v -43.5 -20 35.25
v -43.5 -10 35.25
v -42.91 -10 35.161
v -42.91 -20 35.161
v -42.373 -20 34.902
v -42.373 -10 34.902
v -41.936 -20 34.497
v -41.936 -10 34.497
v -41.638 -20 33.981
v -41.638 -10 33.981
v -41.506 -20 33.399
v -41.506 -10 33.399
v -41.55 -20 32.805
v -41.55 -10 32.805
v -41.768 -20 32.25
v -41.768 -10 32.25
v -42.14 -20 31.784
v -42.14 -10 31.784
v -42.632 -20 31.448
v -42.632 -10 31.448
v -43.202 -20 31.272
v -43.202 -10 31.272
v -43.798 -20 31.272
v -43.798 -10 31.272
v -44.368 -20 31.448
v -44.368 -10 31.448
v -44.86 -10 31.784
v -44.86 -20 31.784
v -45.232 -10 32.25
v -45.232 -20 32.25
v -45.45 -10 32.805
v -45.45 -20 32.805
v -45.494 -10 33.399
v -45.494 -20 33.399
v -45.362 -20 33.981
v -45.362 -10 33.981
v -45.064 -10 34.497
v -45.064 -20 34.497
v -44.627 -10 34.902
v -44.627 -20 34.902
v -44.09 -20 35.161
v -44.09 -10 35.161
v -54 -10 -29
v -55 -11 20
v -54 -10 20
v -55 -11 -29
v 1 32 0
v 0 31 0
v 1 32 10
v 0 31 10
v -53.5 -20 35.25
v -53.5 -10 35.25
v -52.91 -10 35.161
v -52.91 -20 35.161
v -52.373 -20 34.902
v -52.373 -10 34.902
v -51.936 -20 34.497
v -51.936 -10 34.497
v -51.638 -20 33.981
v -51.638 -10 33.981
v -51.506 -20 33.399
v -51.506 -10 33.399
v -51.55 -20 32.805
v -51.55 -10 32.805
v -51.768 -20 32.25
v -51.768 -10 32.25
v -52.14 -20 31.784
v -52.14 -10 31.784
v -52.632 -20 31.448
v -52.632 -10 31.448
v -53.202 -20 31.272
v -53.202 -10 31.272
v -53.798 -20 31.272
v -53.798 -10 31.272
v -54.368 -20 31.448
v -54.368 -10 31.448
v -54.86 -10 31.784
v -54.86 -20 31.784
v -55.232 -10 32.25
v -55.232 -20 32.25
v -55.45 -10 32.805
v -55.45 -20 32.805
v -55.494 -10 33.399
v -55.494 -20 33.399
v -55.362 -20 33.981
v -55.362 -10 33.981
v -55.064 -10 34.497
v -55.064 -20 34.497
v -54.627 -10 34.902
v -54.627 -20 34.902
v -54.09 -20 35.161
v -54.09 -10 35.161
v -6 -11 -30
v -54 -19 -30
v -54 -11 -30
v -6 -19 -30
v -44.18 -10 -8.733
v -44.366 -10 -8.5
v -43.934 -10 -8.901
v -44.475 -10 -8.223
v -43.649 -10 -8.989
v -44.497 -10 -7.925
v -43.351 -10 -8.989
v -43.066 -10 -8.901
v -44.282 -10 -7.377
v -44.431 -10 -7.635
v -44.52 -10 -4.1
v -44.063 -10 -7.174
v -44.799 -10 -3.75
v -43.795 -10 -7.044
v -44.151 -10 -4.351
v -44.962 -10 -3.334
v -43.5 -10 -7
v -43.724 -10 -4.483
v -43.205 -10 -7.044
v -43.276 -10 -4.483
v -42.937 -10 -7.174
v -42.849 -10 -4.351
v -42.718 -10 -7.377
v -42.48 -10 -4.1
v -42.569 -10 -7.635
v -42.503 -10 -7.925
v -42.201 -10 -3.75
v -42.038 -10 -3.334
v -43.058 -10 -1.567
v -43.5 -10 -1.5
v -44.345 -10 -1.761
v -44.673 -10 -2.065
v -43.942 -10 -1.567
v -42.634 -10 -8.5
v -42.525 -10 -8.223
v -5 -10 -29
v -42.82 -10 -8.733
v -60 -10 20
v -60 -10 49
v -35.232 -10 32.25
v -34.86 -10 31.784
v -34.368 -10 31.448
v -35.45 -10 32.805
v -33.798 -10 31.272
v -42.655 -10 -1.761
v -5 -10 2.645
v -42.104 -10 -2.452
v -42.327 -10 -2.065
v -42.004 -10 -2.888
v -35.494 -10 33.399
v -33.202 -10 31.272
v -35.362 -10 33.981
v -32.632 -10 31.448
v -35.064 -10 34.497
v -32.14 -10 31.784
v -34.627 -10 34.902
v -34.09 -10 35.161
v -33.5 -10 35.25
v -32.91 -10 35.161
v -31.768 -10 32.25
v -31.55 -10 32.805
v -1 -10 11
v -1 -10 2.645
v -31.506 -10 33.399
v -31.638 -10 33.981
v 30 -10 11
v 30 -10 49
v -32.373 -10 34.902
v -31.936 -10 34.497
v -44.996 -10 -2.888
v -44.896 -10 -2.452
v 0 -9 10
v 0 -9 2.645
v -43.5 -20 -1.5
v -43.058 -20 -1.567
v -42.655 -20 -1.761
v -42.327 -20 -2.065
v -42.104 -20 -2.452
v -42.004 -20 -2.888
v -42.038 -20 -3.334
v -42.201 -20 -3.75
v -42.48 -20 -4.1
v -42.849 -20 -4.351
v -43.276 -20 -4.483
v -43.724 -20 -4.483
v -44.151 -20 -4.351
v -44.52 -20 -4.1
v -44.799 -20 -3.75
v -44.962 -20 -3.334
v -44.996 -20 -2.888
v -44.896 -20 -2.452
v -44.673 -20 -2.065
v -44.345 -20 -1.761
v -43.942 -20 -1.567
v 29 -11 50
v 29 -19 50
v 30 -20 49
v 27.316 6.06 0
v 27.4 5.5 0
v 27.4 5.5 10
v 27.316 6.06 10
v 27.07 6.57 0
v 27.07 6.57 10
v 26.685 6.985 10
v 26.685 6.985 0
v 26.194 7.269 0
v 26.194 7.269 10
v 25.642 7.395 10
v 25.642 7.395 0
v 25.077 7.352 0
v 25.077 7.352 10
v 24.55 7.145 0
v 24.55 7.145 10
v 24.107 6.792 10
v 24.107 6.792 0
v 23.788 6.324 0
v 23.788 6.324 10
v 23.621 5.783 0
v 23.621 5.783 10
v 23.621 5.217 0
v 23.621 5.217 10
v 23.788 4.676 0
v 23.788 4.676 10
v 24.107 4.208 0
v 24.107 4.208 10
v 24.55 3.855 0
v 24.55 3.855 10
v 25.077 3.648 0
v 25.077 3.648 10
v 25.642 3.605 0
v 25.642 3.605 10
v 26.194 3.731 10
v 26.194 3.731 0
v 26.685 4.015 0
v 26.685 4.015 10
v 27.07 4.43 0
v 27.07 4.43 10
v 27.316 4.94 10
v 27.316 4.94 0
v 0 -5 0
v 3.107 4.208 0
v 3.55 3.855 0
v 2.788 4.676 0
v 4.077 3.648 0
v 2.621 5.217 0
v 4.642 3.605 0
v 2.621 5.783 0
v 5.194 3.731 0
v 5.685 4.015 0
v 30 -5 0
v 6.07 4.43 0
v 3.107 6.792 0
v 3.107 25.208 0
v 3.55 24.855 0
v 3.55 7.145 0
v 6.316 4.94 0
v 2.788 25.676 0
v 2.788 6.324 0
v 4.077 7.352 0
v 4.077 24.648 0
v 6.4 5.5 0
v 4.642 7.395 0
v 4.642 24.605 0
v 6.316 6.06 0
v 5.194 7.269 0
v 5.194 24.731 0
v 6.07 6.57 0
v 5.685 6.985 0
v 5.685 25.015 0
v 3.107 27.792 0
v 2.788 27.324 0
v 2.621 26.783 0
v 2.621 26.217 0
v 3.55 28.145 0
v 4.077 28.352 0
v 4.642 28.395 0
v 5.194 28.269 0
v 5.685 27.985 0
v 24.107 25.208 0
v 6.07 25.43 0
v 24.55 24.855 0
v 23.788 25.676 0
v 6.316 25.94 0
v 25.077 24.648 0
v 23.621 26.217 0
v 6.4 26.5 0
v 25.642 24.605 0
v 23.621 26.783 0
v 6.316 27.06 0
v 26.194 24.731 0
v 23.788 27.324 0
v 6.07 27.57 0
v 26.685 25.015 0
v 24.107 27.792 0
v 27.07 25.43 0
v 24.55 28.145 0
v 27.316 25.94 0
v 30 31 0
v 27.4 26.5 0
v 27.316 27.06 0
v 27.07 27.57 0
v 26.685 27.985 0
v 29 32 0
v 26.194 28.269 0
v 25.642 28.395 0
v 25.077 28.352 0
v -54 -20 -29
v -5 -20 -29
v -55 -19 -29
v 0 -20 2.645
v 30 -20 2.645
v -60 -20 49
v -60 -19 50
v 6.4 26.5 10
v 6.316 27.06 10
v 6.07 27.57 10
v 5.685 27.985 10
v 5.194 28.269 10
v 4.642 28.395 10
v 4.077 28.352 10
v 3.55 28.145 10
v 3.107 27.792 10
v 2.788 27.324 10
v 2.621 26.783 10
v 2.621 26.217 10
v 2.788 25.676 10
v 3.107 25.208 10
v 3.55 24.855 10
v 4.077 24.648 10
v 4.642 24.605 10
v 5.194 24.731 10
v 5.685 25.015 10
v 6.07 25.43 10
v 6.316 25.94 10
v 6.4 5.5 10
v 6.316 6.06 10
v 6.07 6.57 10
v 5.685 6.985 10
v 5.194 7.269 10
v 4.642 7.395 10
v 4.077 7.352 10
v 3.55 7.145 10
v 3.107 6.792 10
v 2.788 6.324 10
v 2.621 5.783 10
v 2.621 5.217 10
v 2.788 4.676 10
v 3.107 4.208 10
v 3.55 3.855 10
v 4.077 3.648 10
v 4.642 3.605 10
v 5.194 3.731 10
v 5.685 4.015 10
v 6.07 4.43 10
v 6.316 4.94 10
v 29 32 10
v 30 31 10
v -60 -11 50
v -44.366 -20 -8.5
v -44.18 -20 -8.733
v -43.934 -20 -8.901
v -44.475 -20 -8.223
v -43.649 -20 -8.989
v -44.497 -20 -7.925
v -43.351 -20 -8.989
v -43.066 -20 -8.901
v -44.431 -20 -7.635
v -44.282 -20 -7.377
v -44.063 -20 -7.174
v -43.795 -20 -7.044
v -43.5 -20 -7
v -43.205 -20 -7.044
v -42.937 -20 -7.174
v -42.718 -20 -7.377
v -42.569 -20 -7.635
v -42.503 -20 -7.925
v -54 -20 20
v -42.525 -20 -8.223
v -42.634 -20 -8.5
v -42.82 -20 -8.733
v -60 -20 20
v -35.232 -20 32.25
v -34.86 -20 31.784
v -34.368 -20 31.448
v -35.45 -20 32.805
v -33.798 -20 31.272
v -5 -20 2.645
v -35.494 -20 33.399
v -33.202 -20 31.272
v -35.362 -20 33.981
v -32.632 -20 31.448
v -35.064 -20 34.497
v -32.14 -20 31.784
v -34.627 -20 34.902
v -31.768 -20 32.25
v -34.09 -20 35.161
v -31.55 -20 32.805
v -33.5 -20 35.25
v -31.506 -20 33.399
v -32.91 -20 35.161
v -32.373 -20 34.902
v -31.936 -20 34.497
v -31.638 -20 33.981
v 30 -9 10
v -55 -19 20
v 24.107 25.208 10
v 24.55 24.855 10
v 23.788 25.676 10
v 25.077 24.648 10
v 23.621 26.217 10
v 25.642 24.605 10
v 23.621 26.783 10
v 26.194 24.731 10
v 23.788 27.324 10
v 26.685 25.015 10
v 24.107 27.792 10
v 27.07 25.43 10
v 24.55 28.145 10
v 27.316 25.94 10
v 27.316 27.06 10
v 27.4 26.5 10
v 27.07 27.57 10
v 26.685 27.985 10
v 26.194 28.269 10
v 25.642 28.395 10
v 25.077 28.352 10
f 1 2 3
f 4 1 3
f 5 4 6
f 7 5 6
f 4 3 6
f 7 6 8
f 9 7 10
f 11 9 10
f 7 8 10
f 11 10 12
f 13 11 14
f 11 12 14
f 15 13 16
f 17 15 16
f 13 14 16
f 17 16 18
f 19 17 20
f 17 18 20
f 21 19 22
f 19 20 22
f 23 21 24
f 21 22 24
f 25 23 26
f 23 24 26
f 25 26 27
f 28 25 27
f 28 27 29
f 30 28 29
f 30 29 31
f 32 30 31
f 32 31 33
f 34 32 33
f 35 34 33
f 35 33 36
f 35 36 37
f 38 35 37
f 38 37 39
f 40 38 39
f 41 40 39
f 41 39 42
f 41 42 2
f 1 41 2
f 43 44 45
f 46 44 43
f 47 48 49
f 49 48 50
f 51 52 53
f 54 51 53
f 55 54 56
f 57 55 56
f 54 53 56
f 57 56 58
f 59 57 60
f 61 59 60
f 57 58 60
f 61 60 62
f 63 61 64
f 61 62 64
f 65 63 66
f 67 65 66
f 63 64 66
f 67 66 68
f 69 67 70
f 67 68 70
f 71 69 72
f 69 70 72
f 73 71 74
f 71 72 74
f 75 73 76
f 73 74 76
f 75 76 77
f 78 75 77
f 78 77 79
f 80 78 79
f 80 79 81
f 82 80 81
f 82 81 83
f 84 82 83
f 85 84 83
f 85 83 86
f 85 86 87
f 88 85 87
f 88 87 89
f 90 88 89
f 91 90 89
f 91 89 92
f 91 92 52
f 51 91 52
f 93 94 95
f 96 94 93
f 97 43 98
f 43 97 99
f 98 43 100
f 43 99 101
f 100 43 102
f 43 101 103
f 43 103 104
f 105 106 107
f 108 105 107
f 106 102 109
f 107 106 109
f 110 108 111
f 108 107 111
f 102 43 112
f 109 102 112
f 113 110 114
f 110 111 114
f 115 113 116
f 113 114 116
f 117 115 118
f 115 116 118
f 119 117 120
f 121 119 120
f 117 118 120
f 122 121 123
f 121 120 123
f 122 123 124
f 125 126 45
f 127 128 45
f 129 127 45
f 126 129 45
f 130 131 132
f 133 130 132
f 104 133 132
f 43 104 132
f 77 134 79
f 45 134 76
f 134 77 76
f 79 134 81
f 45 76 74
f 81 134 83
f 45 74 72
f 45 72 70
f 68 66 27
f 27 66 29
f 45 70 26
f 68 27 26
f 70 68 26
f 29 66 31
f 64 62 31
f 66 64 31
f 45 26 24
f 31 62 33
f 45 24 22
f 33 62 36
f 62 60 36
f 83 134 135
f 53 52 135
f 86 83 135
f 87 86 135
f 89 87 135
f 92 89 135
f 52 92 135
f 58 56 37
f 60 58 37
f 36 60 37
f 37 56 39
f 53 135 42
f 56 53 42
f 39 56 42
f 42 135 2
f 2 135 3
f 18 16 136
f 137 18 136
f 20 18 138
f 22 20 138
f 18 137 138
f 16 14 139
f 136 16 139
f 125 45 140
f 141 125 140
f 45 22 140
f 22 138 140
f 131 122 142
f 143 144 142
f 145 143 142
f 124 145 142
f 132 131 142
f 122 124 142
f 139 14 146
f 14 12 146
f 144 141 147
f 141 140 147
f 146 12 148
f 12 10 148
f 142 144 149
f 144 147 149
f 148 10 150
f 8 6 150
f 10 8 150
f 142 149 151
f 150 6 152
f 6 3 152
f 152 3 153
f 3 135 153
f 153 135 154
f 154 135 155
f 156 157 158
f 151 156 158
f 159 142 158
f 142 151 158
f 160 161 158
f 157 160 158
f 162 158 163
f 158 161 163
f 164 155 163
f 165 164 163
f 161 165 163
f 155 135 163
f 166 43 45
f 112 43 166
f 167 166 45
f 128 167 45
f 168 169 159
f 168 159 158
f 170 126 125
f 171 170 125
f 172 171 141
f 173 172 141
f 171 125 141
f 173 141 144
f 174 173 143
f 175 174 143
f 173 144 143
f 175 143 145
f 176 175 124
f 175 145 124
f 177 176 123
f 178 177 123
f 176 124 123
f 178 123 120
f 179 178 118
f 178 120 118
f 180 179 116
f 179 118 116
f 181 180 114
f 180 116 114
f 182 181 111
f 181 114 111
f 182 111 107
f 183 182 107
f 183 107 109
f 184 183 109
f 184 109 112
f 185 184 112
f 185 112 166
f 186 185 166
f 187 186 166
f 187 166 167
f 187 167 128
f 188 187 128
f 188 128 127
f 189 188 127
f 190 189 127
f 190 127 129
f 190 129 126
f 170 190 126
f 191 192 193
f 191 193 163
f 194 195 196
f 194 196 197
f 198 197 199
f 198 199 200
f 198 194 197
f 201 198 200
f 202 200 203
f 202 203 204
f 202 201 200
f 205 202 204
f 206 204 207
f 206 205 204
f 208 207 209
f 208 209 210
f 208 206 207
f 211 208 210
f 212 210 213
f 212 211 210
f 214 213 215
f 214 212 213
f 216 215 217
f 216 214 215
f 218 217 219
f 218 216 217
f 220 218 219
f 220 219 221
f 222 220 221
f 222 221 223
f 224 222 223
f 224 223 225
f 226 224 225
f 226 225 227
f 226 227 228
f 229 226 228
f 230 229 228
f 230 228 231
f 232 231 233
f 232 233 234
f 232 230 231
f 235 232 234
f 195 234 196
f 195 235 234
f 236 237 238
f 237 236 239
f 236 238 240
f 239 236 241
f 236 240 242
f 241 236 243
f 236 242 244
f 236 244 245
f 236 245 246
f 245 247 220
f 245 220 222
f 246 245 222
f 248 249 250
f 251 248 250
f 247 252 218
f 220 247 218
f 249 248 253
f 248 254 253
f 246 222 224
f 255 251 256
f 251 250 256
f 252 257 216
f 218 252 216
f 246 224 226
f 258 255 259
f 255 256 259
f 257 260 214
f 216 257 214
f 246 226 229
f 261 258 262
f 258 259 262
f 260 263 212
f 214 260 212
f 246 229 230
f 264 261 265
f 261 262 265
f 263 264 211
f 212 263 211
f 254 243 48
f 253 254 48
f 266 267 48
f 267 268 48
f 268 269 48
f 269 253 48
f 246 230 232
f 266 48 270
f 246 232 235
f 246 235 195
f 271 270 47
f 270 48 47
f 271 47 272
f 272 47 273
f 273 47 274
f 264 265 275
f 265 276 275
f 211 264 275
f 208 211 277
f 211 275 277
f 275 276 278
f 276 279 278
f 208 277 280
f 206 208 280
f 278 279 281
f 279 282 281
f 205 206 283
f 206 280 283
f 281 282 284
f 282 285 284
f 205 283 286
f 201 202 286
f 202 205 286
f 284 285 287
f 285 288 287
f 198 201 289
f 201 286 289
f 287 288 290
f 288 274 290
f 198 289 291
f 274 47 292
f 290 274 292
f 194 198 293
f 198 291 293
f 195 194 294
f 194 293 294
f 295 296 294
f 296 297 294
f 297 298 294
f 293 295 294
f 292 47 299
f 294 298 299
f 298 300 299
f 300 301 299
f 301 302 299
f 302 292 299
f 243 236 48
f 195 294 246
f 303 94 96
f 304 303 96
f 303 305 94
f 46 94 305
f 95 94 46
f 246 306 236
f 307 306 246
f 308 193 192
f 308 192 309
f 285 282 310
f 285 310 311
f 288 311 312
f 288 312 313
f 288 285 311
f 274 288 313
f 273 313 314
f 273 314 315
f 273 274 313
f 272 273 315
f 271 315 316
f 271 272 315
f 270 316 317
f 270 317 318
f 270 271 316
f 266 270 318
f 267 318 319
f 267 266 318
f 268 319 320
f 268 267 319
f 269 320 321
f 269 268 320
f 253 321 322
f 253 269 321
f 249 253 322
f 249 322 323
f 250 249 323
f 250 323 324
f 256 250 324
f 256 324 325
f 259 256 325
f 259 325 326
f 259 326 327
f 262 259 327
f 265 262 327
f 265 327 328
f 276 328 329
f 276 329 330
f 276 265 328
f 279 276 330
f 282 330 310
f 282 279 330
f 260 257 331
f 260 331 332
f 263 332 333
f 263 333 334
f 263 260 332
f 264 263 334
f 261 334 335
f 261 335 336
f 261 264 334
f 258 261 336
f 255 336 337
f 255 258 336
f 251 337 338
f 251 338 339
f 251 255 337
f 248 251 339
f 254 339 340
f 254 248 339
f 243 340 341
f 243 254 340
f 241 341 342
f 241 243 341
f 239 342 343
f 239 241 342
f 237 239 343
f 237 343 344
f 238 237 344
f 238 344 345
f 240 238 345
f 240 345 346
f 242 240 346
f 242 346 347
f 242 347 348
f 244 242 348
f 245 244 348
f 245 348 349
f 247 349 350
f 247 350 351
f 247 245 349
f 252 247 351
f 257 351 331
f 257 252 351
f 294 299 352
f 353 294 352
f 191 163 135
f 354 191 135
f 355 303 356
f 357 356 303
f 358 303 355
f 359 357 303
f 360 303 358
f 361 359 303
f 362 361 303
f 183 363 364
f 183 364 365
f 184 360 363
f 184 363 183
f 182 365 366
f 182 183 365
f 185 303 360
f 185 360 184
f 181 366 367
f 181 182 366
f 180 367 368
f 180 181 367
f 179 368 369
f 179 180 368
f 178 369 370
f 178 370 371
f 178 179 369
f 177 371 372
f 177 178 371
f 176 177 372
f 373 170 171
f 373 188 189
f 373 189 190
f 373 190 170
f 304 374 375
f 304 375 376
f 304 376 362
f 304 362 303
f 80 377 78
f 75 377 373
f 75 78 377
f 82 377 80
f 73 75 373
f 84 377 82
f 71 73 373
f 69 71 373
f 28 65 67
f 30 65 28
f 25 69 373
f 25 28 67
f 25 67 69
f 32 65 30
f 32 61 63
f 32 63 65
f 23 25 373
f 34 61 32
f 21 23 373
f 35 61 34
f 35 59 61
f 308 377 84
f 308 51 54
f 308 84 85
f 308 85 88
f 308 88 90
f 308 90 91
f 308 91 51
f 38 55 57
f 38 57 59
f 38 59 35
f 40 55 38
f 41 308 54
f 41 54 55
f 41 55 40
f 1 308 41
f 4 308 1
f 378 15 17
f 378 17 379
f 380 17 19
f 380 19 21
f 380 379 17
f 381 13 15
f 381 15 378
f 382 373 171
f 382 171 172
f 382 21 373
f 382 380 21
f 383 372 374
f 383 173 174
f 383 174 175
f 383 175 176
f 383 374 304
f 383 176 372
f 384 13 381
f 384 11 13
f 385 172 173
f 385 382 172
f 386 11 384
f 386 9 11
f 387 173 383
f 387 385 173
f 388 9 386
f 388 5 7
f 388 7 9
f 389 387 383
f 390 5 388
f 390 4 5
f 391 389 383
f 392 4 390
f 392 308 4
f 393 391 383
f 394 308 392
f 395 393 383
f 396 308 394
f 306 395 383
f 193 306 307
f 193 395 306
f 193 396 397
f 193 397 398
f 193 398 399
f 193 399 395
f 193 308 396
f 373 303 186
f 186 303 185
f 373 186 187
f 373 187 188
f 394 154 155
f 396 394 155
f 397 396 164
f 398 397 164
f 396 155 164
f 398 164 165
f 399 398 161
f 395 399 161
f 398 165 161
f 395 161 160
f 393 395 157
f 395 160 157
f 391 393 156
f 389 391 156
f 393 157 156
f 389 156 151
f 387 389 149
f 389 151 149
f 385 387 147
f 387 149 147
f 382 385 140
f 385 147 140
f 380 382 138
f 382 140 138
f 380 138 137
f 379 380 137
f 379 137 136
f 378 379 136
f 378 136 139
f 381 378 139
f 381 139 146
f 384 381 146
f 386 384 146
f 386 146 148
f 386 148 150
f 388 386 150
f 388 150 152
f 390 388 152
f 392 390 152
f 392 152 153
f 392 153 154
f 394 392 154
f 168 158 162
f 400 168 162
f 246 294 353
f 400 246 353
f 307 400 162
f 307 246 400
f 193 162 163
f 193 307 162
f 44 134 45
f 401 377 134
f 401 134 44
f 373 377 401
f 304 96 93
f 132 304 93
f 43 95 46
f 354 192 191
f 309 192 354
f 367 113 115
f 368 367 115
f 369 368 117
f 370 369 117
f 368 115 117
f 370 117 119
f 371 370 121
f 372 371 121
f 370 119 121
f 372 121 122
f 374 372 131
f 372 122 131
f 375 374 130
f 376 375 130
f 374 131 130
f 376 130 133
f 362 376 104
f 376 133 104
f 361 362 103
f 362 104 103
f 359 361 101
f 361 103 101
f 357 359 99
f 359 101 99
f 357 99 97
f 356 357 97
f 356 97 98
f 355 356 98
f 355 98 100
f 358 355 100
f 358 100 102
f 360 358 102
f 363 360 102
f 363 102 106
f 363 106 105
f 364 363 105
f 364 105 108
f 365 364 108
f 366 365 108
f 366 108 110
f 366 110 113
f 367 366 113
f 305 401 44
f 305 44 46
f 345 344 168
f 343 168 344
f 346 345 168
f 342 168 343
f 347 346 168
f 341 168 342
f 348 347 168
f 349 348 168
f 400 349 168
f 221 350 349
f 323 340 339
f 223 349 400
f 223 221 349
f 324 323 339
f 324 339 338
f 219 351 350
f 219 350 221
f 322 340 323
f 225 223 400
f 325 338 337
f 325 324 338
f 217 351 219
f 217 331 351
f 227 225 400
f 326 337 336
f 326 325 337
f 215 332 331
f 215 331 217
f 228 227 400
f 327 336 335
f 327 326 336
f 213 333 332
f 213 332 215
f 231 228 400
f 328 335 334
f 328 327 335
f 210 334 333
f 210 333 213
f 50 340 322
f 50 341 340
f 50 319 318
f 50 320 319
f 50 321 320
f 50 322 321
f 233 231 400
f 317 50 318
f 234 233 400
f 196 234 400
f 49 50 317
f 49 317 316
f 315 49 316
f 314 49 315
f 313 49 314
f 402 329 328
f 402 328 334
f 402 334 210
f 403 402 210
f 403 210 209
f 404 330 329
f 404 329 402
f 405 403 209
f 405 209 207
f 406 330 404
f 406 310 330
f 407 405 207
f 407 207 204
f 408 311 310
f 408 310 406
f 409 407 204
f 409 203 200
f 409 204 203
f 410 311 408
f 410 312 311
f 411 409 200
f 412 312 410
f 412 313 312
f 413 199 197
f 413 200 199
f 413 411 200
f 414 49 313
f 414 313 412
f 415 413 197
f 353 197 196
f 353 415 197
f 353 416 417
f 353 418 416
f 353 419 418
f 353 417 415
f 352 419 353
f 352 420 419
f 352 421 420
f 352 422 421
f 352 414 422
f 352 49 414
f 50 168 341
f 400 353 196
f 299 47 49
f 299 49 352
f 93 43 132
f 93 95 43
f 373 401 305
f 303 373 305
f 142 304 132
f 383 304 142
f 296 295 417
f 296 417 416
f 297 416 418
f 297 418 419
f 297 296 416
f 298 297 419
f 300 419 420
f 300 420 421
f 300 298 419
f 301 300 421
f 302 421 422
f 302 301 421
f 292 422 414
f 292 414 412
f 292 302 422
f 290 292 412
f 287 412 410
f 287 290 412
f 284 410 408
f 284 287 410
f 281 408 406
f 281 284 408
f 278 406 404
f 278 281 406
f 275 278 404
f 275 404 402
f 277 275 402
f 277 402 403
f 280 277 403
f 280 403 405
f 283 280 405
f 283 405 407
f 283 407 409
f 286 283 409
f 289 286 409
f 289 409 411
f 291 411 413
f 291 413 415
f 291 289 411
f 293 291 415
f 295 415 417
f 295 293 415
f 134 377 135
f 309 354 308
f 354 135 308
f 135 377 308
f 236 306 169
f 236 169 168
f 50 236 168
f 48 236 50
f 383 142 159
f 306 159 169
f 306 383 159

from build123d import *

# Parameters (mm, degrees)
SKETCH1_W           = 30
SKETCH1_H           = 52
SKETCH1_R           = 1.9
BOSS_EXTRUDE1_DEPTH = 10
CHAMFER1_SIZE       = 15
CHAMFER1_SIZE2      = 2.644904711
SKETCH2_W           = 5
SKETCH2_H           = 7.355095289
SKETCH2_H_2         = 30
BOSS_EXTRUDE2_DEPTH = 10
SKETCH3_R           = 1
SKETCH3_R_2         = 1.5
SKETCH3_R_3         = 2
CUT_EXTRUDE1_DEPTH  = 35
CHAMFER2_SIZE       = 1


with BuildPart() as part:
    # Sketch1 → Boss-Extrude1 (new body)
    with BuildSketch(Plane.XY):
        with Locations((15, 6)):
            Rectangle(SKETCH1_W, SKETCH1_H)
        with Locations((4.5, 26.5)):
            Circle(SKETCH1_R, mode=Mode.SUBTRACT)
        with Locations((25.5, 26.5)):
            Circle(SKETCH1_R, mode=Mode.SUBTRACT)
        with Locations((25.5, 5.5)):
            Circle(SKETCH1_R, mode=Mode.SUBTRACT)
        with Locations((4.5, 5.5)):
            Circle(SKETCH1_R, mode=Mode.SUBTRACT)
    extrude(amount=BOSS_EXTRUDE1_DEPTH)

    # Chamfer1
    chamfer1_edges = [part.edges().sort_by_distance(p)[0] for p in [
        (15, -20, 0),
    ]]
    chamfer1_side = [part.faces().sort_by_distance(p)[0] for p in [
        (15, 5.700491631, 0),
    ]]
    chamfer(chamfer1_edges, length=CHAMFER1_SIZE, length2=CHAMFER1_SIZE2, reference=chamfer1_side[0])

    # Sketch2 → Boss-Extrude2 (add)
    with BuildSketch(Plane.XZ.offset(20)):
        Polygon((0, 10), (30, 10), (30, 50), (-55, 50), (-55, 20), (-55, 10), (-5, 10), align=None)
        Polygon((-5, 2.644904711), (-5, 10), (-55, 10), (-55, -30), (-5, -30), align=None)
        with Locations((-2.5, 6.322452356)):
            Rectangle(SKETCH2_W, SKETCH2_H)
        with Locations((-57.5, 35)):
            Rectangle(SKETCH2_W, SKETCH2_H_2)
    extrude(amount=-BOSS_EXTRUDE2_DEPTH)

    # Sketch3 → Cut-Extrude1 (cut)
    with BuildSketch(Plane(origin=(0, -10, 0), x_dir=(1, 0, 0), z_dir=(0, 1, 0))):
        with Locations(Location((-43.5, 8, 0), (0, 0, 270))):
            Circle(SKETCH3_R)
        with Locations(Location((-43.5, 3, 0), (0, 0, 270))):
            Circle(SKETCH3_R_2)
        with Locations(Location((-33.5, -33.25, 0), (0, 0, 270))):
            Circle(SKETCH3_R_3)
        with Locations(Location((-53.5, -33.25, 0), (0, 0, 270))):
            Circle(SKETCH3_R_3)
        with Locations(Location((-43.5, -33.25, 0), (0, 0, 270))):
            Circle(SKETCH3_R_3)
    extrude(amount=-CUT_EXTRUDE1_DEPTH, mode=Mode.SUBTRACT)

    # Chamfer2
    chamfer2_edges = [part.edges().sort_by_distance(p)[0] for p in [
        (0, 32, 5),
        (30, 32, 5),
        (-15, -10, 50),
        (30, -15, 50),
        (-30, -10, -30),
        (-5, -15, -30),
        (-55, -15, -30),
        (-55, -20, -5),
        (-15, -20, 50),
        (-30, -20, -30),
        (-55, -10, -5),
        (15, -10, 10),
        (0, -10, 6.322452355),
    ]]
    chamfer(chamfer2_edges, length=CHAMFER2_SIZE)


solid = part.part
